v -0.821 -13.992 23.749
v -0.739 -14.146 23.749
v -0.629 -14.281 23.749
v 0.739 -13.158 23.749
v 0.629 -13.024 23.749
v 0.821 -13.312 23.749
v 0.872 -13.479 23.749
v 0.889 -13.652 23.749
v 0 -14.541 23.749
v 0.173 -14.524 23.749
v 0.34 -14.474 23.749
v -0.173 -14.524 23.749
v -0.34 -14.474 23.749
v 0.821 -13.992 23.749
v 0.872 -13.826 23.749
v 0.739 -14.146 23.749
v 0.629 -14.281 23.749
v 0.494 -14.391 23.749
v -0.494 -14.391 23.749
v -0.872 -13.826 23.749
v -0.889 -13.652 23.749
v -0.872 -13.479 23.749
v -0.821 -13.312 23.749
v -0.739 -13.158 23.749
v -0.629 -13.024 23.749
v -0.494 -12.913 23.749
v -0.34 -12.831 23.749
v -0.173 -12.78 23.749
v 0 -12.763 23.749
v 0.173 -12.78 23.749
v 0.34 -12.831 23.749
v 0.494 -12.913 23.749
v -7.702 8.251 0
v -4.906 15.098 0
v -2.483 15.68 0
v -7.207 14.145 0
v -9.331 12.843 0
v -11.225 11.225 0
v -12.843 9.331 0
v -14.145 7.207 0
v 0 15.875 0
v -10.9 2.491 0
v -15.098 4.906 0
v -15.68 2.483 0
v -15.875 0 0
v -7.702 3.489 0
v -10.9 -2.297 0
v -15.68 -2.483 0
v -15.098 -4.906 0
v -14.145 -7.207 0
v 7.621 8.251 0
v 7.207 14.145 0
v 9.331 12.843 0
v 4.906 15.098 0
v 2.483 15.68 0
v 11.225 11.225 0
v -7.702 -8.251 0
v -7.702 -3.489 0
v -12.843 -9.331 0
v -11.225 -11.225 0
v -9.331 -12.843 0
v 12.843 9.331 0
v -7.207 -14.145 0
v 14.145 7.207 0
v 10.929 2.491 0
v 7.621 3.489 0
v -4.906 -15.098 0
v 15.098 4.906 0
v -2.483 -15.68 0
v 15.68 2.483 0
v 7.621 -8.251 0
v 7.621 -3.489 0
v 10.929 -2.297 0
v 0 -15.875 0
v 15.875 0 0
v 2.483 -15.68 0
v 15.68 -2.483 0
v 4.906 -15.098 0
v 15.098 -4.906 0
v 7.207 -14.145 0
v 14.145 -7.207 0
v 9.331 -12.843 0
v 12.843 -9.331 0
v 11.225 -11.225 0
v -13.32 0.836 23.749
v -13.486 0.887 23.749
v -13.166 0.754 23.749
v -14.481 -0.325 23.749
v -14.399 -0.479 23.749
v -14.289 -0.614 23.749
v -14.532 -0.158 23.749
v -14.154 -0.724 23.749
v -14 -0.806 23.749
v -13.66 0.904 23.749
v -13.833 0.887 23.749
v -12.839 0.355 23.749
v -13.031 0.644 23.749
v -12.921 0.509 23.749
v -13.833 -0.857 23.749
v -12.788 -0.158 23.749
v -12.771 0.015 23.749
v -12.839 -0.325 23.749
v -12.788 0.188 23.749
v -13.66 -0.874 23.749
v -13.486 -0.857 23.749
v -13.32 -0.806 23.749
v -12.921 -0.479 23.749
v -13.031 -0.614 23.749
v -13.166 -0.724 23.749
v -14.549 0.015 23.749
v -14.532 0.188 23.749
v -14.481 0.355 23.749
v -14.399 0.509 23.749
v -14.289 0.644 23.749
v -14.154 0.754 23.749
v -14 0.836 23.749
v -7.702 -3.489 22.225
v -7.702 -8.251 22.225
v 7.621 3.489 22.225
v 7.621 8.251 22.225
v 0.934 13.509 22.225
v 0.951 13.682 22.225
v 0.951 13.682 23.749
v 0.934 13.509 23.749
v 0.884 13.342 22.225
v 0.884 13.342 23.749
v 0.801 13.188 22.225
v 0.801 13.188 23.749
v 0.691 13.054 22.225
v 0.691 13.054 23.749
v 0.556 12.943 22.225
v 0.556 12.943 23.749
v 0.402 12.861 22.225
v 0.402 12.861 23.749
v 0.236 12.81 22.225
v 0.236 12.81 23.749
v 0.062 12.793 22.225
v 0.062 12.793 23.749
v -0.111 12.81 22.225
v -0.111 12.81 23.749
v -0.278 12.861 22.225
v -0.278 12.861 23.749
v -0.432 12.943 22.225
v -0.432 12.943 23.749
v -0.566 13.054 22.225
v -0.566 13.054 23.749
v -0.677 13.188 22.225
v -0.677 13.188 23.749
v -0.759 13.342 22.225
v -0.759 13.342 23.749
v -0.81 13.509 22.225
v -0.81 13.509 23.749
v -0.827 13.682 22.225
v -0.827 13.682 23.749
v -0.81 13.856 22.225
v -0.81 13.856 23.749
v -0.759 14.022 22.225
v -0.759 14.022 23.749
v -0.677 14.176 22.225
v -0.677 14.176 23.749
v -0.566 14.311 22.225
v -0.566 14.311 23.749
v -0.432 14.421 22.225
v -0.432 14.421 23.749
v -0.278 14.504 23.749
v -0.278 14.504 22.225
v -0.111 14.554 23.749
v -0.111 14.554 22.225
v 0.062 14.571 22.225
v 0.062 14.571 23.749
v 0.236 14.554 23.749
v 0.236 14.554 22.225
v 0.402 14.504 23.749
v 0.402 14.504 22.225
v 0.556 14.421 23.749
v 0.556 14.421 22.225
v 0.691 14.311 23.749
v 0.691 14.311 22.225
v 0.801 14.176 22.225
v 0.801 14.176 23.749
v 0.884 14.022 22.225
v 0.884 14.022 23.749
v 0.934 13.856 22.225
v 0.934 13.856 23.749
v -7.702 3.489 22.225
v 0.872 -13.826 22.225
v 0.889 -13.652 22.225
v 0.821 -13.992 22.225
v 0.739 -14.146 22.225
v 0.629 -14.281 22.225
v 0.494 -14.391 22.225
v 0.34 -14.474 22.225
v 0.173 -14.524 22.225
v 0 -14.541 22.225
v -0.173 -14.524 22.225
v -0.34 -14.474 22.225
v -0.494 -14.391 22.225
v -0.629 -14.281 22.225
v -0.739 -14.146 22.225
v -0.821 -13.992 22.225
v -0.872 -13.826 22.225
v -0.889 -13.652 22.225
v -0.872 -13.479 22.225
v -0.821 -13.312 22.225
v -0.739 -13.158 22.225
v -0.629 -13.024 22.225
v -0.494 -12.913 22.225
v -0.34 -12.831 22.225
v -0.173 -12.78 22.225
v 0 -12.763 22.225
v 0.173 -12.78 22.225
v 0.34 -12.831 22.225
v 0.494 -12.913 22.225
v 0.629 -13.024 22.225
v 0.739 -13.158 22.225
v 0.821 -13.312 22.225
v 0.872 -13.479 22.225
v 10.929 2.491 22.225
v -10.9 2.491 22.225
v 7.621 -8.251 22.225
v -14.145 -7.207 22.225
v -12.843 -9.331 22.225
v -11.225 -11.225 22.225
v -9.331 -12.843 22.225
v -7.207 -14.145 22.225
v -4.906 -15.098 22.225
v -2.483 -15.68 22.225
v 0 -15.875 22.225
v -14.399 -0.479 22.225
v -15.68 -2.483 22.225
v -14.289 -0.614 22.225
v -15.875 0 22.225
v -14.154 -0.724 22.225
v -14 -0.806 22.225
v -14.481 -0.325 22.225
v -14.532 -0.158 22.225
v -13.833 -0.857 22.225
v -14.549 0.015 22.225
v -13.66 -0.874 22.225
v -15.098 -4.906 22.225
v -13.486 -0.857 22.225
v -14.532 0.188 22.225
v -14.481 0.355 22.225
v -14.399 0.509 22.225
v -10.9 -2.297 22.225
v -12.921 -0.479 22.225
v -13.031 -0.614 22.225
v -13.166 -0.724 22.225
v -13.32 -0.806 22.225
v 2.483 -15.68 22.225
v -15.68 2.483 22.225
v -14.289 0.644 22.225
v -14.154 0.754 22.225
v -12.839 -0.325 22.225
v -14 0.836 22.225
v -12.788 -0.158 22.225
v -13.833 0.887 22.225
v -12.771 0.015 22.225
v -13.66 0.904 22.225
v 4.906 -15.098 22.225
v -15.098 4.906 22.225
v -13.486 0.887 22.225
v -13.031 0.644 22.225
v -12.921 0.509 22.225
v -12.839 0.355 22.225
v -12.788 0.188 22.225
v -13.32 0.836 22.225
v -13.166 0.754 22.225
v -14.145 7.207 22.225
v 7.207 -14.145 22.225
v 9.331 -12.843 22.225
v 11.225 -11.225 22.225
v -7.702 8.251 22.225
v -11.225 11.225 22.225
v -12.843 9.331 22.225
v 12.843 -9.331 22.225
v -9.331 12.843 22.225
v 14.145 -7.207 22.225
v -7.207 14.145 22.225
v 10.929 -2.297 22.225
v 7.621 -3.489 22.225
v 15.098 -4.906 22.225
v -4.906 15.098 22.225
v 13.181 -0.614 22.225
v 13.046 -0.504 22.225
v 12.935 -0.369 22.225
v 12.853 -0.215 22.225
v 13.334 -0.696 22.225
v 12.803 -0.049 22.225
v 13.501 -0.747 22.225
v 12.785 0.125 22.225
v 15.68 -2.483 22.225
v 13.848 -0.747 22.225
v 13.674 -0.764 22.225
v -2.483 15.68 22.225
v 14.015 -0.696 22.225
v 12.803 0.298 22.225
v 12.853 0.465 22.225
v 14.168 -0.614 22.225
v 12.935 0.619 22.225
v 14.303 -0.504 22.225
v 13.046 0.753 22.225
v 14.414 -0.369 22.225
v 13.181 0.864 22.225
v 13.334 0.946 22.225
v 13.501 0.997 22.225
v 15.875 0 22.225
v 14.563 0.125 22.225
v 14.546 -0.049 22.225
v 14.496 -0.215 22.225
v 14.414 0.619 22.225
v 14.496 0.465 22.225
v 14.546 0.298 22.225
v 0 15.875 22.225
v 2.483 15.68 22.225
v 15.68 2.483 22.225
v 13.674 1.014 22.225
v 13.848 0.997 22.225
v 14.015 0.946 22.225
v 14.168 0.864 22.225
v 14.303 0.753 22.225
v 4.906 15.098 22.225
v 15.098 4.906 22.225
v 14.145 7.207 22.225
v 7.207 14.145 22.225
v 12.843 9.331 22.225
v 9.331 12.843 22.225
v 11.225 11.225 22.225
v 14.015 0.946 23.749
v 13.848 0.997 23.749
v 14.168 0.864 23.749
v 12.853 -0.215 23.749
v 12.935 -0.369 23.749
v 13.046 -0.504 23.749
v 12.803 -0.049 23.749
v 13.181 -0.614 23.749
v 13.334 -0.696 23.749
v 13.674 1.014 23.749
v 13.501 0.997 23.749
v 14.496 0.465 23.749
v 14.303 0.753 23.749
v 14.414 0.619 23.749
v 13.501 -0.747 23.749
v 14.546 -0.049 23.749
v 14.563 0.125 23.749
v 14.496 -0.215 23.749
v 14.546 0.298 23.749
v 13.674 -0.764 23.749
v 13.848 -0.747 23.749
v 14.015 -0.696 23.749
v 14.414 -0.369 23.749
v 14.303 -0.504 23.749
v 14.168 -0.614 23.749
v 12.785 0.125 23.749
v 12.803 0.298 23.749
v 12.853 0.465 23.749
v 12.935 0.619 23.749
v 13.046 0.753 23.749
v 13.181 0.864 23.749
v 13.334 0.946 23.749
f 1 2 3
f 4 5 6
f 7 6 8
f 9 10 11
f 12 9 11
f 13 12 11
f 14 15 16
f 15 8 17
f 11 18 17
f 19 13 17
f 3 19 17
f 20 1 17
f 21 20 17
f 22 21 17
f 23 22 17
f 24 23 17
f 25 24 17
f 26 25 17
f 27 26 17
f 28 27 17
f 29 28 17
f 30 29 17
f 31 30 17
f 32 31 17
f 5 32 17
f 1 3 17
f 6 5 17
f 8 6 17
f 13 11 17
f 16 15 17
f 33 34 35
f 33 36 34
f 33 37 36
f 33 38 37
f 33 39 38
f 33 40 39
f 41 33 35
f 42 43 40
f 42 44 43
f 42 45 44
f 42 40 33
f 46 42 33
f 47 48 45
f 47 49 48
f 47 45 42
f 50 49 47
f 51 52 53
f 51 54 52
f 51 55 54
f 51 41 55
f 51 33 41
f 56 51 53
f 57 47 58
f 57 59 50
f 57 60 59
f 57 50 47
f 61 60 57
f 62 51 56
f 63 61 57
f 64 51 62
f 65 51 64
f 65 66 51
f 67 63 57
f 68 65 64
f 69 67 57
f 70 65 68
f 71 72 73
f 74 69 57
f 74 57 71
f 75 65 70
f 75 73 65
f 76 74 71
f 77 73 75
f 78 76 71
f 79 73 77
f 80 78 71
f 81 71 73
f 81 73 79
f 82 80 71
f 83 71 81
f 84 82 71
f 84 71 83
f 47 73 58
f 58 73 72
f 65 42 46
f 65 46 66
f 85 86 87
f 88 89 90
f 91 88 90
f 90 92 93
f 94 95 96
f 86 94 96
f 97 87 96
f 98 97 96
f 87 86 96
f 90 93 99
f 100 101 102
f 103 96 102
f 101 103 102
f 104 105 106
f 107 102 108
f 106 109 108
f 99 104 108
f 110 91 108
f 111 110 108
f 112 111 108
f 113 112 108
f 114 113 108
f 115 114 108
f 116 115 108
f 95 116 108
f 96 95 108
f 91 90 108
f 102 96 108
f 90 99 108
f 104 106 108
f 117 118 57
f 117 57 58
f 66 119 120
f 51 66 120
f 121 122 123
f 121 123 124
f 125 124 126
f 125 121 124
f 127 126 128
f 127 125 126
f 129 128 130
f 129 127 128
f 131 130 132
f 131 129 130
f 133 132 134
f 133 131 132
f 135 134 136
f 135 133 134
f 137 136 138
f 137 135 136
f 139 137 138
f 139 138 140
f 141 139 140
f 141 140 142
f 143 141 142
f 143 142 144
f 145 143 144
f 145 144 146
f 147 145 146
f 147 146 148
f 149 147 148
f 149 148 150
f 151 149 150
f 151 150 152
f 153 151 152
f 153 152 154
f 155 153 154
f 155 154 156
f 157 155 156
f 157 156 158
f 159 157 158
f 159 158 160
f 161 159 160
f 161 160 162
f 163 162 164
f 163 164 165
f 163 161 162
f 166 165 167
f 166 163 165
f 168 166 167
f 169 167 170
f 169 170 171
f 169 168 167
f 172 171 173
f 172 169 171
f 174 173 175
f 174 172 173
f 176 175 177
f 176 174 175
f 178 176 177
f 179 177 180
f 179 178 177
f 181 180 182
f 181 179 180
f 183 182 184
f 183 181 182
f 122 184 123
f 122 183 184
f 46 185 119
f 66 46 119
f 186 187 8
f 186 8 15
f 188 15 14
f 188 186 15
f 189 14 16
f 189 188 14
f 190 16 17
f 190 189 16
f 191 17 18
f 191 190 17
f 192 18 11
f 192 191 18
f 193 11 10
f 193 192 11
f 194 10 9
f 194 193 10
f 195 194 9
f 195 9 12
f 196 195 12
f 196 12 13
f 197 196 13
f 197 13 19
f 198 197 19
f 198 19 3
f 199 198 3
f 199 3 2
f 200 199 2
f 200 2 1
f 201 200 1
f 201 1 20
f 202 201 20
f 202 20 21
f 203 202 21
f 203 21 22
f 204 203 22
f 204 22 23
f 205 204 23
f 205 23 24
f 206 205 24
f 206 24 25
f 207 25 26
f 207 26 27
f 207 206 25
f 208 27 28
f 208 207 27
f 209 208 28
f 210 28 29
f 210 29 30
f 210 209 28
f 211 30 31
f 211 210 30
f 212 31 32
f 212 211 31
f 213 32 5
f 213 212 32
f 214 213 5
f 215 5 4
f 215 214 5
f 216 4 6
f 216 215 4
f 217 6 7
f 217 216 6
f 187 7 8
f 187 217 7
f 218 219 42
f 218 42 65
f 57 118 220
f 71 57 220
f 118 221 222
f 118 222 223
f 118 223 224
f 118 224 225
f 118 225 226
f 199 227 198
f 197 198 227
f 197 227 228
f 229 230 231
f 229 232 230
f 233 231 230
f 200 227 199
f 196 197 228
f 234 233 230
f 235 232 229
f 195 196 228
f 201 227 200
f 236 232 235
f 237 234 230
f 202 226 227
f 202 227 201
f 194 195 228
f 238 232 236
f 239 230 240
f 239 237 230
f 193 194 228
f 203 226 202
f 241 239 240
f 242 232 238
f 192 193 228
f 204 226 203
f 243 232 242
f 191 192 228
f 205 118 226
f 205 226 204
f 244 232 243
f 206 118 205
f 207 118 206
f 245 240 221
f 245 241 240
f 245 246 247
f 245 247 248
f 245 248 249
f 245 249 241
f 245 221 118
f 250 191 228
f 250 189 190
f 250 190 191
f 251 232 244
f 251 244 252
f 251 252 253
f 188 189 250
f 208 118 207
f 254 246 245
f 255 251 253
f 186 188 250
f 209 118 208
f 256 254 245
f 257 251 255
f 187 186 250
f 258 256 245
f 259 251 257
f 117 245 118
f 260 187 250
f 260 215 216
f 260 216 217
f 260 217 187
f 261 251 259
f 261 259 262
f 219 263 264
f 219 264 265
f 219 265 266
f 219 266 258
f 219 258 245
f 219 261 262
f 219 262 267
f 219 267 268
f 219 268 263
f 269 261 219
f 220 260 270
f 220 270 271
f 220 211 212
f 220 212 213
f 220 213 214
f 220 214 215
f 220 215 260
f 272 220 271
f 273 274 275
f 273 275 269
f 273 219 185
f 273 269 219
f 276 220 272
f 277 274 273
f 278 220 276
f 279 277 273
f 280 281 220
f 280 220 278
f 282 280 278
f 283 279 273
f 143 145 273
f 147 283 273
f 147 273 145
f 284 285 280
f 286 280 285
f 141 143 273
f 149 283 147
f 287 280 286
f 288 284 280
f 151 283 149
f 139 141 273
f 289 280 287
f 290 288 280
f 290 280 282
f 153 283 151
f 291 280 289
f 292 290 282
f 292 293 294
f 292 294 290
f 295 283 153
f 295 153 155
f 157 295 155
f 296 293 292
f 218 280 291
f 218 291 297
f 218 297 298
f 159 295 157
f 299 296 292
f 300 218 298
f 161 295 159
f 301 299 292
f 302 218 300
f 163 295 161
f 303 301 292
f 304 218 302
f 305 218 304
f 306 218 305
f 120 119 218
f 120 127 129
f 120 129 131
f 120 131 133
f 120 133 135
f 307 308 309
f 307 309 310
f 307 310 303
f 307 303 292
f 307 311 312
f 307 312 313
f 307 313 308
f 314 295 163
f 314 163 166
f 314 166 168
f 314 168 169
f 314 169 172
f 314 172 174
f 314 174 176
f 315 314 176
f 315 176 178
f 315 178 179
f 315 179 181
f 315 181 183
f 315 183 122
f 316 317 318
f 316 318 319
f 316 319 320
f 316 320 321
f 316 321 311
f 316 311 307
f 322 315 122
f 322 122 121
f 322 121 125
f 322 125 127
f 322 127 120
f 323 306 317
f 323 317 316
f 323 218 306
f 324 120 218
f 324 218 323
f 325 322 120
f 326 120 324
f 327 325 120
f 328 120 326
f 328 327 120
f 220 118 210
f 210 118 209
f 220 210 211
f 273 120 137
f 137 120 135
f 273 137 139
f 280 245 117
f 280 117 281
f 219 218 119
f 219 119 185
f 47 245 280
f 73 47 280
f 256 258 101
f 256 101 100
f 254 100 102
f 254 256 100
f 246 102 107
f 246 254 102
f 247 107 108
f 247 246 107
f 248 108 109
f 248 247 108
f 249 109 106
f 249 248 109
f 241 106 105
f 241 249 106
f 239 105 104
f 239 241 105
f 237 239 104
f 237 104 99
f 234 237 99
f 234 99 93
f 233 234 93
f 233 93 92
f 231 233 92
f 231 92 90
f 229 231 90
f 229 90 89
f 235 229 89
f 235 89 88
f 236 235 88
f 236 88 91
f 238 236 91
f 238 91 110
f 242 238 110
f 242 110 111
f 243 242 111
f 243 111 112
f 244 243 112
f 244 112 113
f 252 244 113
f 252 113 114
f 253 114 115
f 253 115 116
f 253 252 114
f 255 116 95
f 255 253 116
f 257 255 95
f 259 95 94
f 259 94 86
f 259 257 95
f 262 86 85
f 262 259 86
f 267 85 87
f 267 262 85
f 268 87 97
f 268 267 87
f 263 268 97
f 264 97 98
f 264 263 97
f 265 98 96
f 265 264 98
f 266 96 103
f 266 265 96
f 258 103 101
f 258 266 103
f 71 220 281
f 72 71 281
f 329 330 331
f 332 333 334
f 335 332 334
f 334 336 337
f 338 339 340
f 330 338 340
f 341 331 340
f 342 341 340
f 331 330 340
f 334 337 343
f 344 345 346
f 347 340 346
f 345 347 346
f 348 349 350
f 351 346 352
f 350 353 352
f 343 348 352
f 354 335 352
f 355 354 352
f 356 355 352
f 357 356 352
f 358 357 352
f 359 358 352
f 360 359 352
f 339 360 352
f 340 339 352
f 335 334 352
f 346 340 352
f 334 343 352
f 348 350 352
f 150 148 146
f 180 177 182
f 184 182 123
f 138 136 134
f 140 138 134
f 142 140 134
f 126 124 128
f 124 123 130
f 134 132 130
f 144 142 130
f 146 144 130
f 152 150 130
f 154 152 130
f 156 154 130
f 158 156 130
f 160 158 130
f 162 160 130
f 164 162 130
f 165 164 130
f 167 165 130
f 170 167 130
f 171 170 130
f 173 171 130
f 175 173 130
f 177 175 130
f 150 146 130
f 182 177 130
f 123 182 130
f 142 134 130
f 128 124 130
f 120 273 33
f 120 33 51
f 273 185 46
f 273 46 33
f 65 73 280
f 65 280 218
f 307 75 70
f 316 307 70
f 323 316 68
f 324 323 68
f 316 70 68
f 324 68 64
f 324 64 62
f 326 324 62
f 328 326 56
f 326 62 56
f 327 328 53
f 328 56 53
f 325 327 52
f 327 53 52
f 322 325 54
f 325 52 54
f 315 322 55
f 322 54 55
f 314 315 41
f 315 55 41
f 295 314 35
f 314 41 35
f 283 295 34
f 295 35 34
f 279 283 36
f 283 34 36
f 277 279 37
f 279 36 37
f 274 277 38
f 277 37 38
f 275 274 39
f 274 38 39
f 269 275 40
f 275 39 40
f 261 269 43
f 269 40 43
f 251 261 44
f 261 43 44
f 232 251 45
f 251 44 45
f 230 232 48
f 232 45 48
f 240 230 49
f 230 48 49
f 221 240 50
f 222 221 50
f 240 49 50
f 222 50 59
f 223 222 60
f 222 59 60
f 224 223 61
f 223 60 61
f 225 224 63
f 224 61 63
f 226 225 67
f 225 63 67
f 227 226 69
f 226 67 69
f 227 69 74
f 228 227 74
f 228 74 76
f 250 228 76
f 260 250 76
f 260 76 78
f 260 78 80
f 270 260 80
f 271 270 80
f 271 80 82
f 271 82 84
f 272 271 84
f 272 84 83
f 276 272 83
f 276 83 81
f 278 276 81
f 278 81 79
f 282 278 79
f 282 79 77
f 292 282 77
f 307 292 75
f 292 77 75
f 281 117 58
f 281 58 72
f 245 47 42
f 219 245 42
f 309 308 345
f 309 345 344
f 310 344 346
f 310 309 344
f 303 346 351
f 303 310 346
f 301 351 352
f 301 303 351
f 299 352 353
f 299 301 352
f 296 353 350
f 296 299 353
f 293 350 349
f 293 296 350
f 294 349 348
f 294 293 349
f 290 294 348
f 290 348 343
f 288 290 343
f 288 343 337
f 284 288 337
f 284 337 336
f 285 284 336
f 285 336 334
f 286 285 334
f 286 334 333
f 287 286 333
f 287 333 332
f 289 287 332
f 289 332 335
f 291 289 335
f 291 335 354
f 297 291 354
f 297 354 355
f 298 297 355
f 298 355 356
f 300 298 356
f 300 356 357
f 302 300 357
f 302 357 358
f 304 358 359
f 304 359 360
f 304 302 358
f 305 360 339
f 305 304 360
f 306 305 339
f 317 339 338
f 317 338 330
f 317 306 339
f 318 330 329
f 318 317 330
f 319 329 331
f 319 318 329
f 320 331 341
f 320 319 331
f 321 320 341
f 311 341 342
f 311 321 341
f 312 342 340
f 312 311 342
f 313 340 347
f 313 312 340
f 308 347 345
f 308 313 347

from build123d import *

# Parameters (mm, degrees)
F0_R     = 15.875
F1_DEPTH = 22.225
F3_R     = 0.889
F5_DEPTH = 23.749
F7_W     = 21.828934
F7_H     = 4.78795
F7_W_2   = 15.322826
F7_H_2   = 4.7625
F6_DEPTH = 22.225


with BuildPart() as f1:
    # F0 (on Top) → F1 (new body)
    with BuildSketch(Plane.XY):
        Circle(F0_R)
    extrude(amount=F1_DEPTH)

    # F3 (on face) → F5 (join)
    with BuildSketch(Plane(origin=(0, 0, 0), x_dir=(1, 0, 0), z_dir=(0, 0, -1))):
        with Locations((0, 13.652203)):
            Circle(F3_R)
        with Locations((-13.659894, -0.015021)):
            Circle(F3_R)
        with Locations((0.062219, -13.682245)):
            Circle(F3_R)
        with Locations((13.674476, -0.124876)):
            Circle(F3_R)
    extrude(amount=-F5_DEPTH)

    # F7 (on face) → F6 (cut)
    with BuildSketch(Plane.XY.offset(22.225)):
        with Locations((0.014928, 0.097281)):
            Rectangle(F7_W, F7_H)
        with Locations((-0.040691, 5.869923)):
            Rectangle(F7_W_2, F7_H_2)
        with Locations((-0.040691, -5.869923)):
            Rectangle(F7_W_2, F7_H_2)
    extrude(amount=-F6_DEPTH, mode=Mode.SUBTRACT)


solid = f1.part
